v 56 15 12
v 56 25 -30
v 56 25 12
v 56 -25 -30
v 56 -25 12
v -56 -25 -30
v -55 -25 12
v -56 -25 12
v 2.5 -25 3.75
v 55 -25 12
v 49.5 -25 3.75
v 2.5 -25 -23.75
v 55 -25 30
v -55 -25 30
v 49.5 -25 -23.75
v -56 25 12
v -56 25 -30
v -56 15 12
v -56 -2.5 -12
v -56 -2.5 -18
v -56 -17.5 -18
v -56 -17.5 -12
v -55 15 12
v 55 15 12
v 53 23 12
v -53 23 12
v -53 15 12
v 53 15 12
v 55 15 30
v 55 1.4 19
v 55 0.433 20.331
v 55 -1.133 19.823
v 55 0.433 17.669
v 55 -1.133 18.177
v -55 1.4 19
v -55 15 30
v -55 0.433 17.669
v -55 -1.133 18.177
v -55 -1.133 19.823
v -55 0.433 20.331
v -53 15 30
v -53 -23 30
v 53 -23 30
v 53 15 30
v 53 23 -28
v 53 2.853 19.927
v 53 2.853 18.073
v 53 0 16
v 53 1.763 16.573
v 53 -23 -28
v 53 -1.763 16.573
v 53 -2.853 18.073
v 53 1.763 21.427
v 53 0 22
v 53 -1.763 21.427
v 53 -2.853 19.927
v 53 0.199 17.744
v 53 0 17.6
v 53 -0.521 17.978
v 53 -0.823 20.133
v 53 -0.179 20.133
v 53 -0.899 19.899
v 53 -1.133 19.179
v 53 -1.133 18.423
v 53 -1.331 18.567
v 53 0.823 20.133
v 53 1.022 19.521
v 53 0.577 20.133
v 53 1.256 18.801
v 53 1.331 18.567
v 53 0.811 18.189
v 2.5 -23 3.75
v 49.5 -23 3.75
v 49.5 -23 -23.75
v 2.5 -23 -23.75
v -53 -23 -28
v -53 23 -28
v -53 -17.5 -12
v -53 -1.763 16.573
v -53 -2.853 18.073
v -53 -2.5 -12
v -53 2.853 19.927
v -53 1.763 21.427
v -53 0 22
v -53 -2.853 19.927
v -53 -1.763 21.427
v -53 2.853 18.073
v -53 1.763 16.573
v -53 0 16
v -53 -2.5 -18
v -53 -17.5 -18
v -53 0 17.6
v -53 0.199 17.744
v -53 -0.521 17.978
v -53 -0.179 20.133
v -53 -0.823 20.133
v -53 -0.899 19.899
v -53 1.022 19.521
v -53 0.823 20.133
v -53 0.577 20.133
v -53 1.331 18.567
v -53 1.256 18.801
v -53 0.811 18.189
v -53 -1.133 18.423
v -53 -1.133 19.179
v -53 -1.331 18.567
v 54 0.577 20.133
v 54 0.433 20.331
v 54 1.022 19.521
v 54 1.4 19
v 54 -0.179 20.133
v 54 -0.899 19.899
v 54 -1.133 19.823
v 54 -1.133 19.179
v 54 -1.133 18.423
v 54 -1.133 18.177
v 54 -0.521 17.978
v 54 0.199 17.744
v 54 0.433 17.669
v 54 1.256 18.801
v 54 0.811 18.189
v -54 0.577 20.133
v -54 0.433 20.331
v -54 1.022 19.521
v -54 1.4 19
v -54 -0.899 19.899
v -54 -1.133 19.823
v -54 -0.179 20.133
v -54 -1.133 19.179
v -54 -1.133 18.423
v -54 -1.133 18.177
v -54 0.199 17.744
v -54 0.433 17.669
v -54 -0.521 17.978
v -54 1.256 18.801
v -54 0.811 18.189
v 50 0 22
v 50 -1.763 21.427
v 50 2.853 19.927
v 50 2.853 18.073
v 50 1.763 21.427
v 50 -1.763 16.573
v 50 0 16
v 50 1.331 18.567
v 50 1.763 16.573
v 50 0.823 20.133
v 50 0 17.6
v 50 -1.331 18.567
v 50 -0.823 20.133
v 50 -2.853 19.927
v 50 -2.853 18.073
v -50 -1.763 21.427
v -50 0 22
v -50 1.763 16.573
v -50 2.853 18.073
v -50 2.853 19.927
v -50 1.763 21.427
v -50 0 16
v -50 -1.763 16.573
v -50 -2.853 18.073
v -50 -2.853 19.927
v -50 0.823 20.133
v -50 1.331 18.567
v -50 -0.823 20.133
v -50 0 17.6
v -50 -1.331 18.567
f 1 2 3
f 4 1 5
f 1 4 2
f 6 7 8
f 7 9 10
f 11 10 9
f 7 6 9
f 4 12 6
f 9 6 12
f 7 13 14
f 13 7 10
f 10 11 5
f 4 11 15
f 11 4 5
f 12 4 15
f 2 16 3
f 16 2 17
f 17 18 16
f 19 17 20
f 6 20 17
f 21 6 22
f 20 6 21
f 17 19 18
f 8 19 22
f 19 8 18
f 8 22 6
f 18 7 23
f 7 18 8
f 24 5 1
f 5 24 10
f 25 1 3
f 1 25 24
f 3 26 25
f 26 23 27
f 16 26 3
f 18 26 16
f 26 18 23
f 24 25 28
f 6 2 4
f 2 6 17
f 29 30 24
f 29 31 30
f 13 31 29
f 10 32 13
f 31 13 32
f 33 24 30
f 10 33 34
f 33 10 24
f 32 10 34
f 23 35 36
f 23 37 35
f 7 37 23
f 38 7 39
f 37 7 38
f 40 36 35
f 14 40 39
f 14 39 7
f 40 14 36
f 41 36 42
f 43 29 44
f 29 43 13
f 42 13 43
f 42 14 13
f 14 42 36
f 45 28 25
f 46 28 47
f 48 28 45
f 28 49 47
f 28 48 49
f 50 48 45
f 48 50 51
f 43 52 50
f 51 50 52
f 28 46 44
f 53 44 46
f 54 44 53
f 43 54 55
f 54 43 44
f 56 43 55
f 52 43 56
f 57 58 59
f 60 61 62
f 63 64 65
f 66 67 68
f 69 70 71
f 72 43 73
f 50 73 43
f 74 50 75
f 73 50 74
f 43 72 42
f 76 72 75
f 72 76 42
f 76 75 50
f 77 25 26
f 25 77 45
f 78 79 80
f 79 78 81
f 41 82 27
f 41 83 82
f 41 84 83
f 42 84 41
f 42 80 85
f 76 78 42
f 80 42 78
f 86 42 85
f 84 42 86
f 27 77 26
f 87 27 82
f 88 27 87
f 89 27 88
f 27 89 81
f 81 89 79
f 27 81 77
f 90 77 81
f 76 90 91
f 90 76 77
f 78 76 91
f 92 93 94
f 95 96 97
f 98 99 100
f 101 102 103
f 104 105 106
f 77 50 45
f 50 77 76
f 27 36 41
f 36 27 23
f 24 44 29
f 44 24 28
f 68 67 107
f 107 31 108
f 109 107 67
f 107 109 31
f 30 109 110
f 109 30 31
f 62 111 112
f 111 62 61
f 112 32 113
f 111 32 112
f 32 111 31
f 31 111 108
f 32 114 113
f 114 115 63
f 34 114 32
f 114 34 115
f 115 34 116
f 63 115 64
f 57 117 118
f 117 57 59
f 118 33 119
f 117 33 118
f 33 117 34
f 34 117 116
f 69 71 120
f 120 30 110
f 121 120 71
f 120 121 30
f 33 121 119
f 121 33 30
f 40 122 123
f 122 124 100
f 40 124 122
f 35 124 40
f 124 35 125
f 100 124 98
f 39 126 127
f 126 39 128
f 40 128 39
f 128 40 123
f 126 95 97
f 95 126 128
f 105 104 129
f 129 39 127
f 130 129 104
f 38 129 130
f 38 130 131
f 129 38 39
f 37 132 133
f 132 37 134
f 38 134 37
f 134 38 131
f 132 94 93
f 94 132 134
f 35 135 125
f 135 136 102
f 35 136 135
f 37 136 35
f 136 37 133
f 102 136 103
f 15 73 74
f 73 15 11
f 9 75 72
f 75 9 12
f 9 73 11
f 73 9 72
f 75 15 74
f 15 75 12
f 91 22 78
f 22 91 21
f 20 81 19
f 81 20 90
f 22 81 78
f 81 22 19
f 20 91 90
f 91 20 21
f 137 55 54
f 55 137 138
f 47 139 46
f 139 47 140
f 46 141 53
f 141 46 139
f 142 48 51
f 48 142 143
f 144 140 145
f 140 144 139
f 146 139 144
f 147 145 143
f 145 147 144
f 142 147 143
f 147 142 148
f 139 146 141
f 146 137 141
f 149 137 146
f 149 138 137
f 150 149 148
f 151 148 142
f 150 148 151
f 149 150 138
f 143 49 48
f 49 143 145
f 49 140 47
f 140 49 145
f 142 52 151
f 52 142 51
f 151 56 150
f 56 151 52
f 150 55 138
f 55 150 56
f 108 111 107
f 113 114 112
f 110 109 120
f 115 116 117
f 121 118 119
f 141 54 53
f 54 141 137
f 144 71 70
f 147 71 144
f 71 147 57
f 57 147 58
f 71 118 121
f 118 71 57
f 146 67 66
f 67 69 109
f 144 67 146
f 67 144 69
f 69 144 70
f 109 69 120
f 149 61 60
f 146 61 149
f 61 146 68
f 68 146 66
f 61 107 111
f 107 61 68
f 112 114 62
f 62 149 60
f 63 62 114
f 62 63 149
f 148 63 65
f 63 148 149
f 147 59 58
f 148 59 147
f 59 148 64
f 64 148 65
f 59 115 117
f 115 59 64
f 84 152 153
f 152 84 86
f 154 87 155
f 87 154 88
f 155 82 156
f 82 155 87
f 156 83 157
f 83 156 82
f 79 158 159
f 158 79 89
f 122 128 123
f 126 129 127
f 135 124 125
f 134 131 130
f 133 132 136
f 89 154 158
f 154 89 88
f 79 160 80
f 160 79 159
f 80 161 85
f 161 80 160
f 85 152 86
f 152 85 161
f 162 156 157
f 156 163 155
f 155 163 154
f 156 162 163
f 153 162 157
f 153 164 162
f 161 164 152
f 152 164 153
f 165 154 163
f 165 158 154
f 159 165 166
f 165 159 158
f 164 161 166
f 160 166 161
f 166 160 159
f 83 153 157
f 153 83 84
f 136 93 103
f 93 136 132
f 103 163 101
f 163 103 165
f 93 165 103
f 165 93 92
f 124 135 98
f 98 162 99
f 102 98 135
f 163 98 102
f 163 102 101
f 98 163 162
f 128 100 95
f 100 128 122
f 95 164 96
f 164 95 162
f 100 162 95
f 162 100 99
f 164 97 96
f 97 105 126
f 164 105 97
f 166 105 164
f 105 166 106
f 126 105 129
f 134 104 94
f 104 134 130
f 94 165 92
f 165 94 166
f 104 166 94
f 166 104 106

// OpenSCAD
// Cover for 12V DC 30A 360W Regulated Switching Power Supply
// Mendel90 variant
//
// GNU GPL v2
// David Price 2016
//
// 141226 DP Changes to strengthen indent and enable plug clip to engage
// 160105 DP changes for Mendel90 version with socket on side rather than top
//
width=112;
depth=60;
height=50;

termHeight=10;
termDepth=18;

metalThickness=1;
screwThick=3;

wall=2;

plugWidth=47;
plugHeight=27.5;
plugOffset=4;

rotate([90,0,0])
difference(){
union(){

//shell with side indents
translate([0,(depth-termDepth)/2-depth/2,0])
cube([width,depth-termDepth,height], center=true);

// indented part
cube([width-metalThickness*2,depth,height], center=true);
}

//hollow out
translate([0,wall,0])
cube([width-wall*2-metalThickness*2,depth,height-wall*2], center=true);

//terminal block cut out
translate([0,depth/2-termDepth/2,(termHeight-height)/2])
cube([width,termDepth,termHeight], center=true);

//screw holes
translate([width/2, depth/2-termDepth+7],4) rotate ([0,90,0])
cylinder(r=1.4, h=20, center=true);
translate([-width/2, depth/2-termDepth+7],4) rotate ([0,90,0])
cylinder(r=1.4, h=20, center=true);

// Mendel90 version

// IEC plug hole
translate([width/4-2,-10,height/2]){
// plug hole
cube([plugWidth,plugHeight,3*wall], center=true);
// plug clip flange
//#cube([plugWidth,plugHeight+4,wall-1], center=true);
}
//cable hole
translate([-width/2,-depth/4,10])
cube([10,6,15], center=true);
}

// screw reinforcements
difference() {
translate([(width/2)-4, 0,depth/2-termDepth+7]) rotate ([0,90,0])
cylinder(r=3, h=4, center=true);

translate([(width/2)-4, 0,depth/2-termDepth+7]) rotate ([0,90,0])
cylinder(r=1.4, h=10, center=true);    
}

difference() {
#translate([(-width/2)+4, 0, depth/2-termDepth+7]) rotate ([0,90,0])
cylinder(r=3, h=4, center=true);
  
translate([(-width/2)+4.9, 0, depth/2-termDepth+7]) rotate ([0,90,0])
cylinder(r=1.4, h=10, center=true);   
}
